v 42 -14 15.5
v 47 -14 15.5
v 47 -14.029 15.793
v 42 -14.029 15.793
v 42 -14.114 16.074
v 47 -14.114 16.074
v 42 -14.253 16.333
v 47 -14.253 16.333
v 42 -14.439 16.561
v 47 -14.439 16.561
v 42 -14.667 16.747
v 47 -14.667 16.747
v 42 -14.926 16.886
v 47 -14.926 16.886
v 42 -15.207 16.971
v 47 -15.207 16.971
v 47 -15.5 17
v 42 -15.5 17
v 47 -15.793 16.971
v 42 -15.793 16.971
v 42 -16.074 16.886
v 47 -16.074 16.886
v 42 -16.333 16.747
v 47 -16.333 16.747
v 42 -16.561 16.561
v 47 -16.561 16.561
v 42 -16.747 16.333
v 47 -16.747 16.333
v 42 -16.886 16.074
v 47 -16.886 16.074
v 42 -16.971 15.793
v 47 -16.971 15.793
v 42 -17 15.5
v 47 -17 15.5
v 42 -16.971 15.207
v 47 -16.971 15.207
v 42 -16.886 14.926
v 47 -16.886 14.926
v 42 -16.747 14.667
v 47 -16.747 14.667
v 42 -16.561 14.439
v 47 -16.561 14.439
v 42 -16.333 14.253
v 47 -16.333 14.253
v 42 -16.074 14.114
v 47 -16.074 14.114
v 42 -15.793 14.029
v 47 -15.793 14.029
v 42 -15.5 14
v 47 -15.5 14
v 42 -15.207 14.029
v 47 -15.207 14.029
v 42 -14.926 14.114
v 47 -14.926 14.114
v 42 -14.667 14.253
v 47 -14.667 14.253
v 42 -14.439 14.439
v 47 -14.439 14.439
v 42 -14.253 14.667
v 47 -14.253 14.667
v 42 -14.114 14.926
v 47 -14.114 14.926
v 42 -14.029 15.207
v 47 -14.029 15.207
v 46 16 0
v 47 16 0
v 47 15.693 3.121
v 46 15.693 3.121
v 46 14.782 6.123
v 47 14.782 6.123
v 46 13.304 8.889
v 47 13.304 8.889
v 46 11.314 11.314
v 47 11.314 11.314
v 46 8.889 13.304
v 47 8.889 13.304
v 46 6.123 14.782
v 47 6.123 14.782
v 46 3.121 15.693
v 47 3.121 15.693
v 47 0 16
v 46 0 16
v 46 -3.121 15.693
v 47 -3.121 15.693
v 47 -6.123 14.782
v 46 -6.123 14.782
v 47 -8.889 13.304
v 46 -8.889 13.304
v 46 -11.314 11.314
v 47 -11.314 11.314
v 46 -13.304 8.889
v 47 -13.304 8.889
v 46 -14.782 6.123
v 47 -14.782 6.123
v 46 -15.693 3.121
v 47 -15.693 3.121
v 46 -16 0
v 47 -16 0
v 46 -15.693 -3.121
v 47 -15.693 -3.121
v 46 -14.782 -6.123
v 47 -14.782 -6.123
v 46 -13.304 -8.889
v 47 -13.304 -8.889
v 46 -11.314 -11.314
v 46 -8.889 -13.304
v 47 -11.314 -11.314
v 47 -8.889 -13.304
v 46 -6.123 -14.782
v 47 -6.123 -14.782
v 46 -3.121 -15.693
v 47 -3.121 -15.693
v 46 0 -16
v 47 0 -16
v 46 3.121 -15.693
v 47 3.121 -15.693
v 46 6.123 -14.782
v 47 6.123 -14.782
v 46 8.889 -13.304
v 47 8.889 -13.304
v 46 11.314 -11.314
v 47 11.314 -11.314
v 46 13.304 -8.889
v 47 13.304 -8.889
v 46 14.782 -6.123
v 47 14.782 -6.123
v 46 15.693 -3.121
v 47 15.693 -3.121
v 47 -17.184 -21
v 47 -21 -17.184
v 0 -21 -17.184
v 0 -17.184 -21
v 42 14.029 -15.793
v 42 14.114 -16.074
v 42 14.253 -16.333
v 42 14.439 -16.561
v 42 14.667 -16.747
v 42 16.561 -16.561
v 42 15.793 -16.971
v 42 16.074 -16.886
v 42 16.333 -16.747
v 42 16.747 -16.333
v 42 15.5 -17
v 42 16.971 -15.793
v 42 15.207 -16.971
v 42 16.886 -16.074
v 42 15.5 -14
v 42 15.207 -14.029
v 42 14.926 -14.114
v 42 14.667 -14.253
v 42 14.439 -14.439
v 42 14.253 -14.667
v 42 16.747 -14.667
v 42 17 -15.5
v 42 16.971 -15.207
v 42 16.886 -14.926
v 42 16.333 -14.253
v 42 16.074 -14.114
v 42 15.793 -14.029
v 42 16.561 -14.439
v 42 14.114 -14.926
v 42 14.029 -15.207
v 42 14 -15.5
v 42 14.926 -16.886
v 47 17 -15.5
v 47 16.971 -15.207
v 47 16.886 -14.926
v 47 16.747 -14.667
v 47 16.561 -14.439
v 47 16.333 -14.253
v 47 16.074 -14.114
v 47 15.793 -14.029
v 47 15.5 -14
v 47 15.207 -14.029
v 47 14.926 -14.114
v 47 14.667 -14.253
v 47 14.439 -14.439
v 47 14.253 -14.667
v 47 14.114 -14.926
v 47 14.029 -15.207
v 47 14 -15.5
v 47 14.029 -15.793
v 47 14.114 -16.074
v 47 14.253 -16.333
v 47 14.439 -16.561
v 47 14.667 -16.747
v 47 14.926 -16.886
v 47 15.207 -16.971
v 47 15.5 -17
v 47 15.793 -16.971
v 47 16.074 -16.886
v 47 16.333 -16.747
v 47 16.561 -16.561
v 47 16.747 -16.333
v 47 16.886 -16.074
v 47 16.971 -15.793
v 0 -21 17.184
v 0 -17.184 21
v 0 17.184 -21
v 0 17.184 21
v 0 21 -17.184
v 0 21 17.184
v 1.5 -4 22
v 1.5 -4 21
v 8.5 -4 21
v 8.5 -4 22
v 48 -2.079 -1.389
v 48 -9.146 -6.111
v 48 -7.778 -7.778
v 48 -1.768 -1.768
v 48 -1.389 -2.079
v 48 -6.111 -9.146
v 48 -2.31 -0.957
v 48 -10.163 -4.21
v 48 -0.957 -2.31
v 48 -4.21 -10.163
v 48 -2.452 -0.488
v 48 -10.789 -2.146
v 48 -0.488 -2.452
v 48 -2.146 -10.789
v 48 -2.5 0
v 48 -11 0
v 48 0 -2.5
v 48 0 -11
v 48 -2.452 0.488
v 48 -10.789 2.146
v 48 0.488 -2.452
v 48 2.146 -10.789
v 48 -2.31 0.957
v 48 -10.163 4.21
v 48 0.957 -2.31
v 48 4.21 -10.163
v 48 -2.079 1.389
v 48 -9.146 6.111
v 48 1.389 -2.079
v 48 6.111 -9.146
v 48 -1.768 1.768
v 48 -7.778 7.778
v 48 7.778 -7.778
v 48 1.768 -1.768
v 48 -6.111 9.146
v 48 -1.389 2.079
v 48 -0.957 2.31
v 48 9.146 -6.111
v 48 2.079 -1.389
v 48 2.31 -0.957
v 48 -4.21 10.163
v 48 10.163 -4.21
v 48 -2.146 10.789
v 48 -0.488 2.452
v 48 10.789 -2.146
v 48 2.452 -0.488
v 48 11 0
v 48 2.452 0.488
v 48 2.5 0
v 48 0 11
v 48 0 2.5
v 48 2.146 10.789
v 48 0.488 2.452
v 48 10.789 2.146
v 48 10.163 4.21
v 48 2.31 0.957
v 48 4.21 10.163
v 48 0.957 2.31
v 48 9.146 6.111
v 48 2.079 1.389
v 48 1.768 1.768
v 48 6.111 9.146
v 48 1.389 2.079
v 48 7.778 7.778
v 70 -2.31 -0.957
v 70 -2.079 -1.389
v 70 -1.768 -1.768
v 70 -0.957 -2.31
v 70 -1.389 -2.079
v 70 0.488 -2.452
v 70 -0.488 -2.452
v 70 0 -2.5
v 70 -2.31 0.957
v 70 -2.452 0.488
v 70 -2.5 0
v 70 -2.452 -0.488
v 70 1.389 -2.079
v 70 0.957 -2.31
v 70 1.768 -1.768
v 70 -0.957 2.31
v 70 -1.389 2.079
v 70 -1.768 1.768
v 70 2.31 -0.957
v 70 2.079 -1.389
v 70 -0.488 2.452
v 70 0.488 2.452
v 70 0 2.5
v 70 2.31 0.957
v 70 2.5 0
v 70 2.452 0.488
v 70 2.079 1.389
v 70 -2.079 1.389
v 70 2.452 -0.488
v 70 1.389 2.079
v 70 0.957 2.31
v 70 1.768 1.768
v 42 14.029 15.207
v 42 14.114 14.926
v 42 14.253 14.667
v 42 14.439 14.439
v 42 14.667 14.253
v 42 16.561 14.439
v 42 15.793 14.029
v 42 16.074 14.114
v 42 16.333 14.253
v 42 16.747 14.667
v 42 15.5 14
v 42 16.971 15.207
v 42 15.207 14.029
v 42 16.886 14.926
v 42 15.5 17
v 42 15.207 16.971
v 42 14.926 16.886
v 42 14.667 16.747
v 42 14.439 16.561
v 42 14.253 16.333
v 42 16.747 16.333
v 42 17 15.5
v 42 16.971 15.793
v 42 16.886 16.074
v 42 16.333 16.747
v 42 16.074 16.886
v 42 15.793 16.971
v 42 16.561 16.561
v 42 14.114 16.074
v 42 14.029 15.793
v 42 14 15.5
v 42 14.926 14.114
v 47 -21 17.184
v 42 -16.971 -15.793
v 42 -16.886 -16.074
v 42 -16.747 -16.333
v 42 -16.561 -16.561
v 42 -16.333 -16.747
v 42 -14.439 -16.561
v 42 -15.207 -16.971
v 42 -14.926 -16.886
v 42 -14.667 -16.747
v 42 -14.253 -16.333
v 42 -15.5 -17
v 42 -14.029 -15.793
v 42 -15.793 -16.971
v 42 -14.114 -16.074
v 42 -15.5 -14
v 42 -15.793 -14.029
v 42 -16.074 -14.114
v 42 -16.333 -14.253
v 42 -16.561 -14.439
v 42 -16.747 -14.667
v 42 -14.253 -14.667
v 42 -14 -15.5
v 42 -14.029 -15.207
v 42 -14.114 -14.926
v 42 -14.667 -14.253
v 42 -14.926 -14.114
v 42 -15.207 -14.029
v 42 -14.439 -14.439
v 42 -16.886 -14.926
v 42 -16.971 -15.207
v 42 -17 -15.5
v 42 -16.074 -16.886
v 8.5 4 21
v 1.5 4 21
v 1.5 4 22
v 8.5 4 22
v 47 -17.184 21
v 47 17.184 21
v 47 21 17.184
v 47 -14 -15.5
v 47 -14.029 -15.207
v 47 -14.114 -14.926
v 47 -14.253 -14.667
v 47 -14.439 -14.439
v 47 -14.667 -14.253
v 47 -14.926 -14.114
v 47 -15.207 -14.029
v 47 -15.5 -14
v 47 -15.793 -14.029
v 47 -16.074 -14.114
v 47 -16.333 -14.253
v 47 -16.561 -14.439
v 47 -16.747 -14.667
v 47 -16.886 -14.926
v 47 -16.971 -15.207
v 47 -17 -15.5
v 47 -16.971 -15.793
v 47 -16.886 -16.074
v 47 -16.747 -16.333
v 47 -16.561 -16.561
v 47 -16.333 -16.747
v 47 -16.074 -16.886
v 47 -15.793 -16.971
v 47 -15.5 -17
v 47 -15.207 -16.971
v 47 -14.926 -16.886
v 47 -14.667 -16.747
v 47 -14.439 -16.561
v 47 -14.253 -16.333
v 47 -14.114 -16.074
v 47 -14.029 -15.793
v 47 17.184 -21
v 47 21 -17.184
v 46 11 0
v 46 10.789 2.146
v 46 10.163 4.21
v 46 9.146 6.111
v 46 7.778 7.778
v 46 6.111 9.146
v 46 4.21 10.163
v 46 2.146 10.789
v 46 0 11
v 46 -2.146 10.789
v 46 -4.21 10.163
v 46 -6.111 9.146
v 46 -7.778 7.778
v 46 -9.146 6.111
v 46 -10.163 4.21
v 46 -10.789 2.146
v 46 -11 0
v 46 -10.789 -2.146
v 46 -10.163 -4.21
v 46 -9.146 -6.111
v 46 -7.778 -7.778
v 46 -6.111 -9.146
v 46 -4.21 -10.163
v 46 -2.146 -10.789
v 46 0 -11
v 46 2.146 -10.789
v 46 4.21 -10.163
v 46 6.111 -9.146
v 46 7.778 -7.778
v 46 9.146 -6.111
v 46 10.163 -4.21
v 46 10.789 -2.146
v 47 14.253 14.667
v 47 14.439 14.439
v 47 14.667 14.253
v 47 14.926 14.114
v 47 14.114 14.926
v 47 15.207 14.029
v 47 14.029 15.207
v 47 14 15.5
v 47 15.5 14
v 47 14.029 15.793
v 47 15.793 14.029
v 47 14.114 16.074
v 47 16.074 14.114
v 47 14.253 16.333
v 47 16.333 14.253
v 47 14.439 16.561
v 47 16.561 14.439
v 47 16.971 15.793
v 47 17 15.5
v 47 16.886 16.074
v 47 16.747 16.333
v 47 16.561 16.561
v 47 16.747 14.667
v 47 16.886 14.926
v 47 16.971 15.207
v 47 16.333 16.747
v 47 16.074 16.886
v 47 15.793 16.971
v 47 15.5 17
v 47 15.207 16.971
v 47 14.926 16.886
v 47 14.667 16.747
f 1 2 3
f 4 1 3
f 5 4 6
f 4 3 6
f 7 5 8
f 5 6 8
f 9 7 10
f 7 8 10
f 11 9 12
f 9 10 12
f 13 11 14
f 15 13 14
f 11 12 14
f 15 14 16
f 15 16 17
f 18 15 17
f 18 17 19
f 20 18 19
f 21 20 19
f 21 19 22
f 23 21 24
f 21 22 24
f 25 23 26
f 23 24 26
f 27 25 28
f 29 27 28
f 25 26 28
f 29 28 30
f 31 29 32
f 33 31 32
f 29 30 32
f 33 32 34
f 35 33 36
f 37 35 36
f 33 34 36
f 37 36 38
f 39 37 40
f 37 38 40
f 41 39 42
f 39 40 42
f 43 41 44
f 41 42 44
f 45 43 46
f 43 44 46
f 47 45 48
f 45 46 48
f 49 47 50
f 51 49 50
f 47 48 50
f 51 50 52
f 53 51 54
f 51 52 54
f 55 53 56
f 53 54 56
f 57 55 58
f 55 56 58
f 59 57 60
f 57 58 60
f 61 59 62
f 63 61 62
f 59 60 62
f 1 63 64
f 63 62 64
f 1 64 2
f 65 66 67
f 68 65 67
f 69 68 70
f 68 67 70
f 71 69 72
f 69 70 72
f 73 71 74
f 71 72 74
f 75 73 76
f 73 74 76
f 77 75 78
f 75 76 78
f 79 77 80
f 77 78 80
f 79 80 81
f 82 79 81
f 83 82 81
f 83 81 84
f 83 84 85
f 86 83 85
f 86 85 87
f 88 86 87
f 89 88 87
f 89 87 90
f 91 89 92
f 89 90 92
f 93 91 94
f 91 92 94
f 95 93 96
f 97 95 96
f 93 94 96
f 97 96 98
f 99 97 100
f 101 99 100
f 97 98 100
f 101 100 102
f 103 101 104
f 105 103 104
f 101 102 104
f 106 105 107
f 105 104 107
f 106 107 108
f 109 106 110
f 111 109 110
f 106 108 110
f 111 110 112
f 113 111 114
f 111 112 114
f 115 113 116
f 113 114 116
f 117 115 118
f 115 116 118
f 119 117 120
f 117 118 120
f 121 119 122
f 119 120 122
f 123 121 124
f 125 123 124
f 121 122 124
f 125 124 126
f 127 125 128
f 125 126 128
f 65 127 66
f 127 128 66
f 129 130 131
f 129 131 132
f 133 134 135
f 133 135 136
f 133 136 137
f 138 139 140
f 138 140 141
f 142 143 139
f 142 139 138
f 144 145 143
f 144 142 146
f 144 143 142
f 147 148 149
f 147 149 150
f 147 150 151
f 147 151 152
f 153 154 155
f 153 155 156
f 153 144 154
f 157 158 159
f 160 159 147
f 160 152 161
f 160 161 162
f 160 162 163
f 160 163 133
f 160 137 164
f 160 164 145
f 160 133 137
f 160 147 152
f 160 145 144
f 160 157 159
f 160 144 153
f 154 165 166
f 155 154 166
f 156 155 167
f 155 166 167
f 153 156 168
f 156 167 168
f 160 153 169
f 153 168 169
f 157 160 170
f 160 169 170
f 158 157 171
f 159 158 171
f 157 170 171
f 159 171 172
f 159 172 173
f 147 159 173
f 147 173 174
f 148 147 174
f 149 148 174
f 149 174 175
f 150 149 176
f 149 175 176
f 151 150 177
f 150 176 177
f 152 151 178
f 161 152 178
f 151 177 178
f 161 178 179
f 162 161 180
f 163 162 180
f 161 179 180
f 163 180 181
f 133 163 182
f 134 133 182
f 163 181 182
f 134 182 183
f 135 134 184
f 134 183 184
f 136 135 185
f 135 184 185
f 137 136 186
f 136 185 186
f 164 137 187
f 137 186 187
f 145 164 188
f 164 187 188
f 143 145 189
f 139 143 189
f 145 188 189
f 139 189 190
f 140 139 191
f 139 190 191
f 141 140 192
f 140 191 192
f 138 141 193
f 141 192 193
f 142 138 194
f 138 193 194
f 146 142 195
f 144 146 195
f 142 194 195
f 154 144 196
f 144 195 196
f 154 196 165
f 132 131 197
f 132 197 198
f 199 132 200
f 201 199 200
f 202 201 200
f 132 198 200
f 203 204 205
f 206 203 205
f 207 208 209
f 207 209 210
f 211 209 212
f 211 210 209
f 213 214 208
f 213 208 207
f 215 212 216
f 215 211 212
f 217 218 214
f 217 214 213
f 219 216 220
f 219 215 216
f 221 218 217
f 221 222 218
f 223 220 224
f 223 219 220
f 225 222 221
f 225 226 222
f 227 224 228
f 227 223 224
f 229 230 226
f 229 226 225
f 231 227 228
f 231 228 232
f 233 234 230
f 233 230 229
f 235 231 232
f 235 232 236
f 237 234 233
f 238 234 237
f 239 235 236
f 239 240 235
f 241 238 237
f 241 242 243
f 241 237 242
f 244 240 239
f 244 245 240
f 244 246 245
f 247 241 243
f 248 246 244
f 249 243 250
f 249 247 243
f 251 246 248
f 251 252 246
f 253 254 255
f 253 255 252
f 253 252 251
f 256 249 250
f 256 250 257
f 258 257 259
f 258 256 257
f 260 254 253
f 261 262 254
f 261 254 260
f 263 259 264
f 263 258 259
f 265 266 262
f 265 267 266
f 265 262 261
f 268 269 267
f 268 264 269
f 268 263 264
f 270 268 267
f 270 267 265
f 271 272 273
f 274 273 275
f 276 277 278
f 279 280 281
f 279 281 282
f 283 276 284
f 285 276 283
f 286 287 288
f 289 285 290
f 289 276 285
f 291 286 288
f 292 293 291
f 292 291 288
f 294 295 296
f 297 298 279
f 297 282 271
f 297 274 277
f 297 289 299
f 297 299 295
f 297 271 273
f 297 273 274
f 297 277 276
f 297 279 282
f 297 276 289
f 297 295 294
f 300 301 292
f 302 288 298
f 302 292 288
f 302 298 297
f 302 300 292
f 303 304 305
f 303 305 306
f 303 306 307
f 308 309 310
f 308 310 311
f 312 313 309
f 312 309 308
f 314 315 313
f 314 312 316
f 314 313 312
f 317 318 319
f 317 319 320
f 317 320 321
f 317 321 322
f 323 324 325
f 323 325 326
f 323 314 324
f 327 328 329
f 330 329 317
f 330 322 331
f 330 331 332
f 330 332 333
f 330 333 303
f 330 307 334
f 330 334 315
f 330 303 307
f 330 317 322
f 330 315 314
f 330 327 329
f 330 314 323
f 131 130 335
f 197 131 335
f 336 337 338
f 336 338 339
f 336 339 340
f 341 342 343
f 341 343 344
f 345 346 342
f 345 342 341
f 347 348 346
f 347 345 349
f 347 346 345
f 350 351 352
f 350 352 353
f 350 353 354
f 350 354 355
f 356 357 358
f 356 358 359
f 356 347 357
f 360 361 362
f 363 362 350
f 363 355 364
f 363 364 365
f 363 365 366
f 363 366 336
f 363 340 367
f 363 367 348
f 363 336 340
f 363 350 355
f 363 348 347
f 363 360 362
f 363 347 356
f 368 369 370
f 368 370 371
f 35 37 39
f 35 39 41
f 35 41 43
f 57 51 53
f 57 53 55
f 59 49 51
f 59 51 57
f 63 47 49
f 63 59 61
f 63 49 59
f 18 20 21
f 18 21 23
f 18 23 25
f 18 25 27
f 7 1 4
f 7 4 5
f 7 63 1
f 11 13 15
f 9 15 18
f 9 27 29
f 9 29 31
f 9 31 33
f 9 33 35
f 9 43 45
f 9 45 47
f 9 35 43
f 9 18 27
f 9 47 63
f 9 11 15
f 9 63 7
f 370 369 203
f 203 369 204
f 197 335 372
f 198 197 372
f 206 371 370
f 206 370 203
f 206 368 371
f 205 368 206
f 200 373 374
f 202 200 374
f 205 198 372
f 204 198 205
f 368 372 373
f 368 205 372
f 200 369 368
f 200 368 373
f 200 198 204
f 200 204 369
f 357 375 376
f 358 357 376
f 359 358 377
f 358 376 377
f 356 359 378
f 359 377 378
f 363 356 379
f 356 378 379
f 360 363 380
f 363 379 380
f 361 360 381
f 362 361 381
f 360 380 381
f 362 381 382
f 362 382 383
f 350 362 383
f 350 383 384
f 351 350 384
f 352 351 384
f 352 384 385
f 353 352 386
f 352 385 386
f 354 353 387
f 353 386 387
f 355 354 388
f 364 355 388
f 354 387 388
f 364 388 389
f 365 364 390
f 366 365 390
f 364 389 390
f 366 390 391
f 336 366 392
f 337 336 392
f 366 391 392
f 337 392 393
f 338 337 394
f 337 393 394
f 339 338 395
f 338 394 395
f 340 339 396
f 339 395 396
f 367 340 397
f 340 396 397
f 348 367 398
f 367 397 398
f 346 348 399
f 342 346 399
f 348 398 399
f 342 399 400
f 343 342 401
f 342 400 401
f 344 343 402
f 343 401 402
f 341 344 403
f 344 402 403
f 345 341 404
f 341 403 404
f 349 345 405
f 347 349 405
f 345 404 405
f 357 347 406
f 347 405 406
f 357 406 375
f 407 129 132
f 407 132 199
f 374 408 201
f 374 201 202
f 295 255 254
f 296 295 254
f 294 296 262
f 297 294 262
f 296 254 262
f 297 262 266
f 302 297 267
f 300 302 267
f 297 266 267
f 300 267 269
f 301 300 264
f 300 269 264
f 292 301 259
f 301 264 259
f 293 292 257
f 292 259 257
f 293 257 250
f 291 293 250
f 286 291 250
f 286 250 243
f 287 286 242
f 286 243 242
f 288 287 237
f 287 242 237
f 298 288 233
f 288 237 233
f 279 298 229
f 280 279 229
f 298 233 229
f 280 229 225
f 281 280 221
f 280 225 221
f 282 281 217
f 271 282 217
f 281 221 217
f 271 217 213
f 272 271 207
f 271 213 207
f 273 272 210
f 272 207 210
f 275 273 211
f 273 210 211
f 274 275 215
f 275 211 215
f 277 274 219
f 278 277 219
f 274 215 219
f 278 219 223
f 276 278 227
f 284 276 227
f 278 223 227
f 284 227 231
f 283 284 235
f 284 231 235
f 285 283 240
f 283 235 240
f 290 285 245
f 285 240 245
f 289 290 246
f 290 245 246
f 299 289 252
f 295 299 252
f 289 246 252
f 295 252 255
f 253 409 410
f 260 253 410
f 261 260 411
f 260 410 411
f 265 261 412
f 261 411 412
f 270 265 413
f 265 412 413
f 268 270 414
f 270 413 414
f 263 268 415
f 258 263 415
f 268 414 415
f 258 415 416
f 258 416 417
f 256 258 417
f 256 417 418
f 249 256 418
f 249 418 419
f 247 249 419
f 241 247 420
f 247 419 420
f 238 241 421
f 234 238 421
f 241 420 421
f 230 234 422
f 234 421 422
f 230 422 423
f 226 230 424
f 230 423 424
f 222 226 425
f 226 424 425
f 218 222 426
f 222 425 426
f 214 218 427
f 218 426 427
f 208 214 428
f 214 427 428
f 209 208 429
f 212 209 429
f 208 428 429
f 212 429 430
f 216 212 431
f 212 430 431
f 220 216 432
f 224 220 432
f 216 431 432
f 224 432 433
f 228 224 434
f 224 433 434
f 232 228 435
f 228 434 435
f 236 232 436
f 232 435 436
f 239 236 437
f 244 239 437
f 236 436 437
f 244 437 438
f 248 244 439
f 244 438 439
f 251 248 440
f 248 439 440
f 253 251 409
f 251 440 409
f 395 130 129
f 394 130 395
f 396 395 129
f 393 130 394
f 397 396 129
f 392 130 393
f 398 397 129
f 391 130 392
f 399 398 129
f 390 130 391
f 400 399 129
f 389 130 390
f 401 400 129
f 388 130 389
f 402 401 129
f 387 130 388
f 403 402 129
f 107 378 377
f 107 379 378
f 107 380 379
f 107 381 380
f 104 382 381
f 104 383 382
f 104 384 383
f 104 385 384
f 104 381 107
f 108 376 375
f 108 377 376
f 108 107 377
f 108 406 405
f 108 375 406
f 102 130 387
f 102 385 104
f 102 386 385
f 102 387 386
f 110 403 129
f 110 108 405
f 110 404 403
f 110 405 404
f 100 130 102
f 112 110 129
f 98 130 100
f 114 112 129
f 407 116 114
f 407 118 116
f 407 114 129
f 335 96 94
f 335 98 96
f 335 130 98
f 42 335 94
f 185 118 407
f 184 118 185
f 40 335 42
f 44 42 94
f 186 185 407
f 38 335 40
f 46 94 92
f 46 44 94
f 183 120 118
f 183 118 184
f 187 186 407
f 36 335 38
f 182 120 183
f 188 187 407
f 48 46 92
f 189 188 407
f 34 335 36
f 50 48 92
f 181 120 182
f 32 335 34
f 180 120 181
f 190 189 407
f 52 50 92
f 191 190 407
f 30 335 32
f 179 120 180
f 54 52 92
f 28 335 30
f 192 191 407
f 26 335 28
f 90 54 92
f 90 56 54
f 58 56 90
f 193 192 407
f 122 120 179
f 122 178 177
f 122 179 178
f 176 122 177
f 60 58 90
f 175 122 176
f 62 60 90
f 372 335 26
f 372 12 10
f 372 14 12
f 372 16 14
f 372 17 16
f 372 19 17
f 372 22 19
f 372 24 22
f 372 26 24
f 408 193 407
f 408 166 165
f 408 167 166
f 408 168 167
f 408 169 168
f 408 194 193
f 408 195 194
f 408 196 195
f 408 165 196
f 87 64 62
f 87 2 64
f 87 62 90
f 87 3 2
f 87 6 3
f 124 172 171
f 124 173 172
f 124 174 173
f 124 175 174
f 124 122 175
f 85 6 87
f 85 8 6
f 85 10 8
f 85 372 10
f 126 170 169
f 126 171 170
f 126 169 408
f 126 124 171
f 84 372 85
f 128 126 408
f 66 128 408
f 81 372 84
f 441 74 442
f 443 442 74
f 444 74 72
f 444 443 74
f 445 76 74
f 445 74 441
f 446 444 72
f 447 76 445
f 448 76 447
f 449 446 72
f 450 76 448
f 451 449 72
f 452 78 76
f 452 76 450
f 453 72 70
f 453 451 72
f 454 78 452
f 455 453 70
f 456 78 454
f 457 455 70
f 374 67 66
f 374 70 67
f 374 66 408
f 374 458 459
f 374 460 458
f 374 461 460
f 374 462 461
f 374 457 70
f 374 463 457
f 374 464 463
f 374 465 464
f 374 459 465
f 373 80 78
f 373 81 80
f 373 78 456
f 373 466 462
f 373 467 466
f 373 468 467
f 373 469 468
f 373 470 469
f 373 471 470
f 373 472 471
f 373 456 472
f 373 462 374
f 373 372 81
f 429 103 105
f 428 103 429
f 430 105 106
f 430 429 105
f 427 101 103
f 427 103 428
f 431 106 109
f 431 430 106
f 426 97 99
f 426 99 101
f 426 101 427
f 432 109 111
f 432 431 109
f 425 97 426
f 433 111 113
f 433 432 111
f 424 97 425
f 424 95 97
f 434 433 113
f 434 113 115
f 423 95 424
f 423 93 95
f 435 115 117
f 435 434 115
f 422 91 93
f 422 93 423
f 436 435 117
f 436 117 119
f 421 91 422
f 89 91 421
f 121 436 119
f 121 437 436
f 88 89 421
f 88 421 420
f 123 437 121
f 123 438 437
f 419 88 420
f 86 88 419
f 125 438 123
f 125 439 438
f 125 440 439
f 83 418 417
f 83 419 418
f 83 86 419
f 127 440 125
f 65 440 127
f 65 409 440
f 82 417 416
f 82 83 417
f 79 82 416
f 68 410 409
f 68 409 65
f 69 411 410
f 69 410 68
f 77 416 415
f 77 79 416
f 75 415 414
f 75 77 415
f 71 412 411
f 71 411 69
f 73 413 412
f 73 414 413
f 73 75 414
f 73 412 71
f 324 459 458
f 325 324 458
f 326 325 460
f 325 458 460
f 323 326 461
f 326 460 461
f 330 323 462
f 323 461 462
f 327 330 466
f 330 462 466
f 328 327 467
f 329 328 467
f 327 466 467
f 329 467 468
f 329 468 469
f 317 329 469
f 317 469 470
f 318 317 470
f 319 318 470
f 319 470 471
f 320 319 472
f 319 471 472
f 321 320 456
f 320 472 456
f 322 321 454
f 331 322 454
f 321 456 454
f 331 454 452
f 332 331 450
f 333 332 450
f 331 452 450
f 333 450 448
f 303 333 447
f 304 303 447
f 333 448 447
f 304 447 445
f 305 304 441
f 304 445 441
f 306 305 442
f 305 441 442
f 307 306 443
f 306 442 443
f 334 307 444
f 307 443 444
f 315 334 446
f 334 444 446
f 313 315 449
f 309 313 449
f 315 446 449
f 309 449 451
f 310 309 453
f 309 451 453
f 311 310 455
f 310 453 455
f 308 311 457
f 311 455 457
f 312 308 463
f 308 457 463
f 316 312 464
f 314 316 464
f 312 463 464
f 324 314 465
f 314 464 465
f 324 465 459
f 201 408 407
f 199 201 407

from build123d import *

# Parameters (mm, degrees)
SKETCH_W        = 42
SKETCH_H        = 42
PAD_DEPTH       = 47
SKETCH001_R     = 1.5
POCKET_DEPTH    = 5
POCKET001_DEPTH = 47
SKETCH003_R     = 16
POCKET002_DEPTH = 1
SKETCH004_R     = 11
PAD001_DEPTH    = 2
SKETCH005_R     = 2.5
PAD002_DEPTH    = 22
SKETCH006_W     = 8
SKETCH006_H     = 7
PAD003_DEPTH    = 1


with BuildPart() as part:
    # Sketch → Pad (new body)
    with BuildSketch(Plane.YZ):
        Rectangle(SKETCH_W, SKETCH_H)
    extrude(amount=PAD_DEPTH)

    # Sketch001 → Pocket (cut)
    with BuildSketch(Plane.YZ.offset(47)):
        with Locations((15.5, 15.5)):
            Circle(SKETCH001_R)
        with Locations((-15.5, 15.5)):
            Circle(SKETCH001_R)
        with Locations((-15.5, -15.5)):
            Circle(SKETCH001_R)
        with Locations((15.5, -15.5)):
            Circle(SKETCH001_R)
    extrude(amount=-POCKET_DEPTH, mode=Mode.SUBTRACT)

    # Sketch002 → Pocket001 (cut)
    with BuildSketch(Plane.YZ.offset(47)):
        Polygon((-21, 21), (-21, 17.183766), (-17.183766, 21), align=None)
        Polygon((21, 21), (17.183766, 21), (21, 17.183766), align=None)
        Polygon((21, -21), (21, -17.183766), (17.183766, -21), align=None)
        Polygon((-21, -21), (-21, -17.183766), (-17.183766, -21), align=None)
    extrude(amount=-POCKET001_DEPTH, mode=Mode.SUBTRACT)

    # Sketch003 → Pocket002 (cut)
    with BuildSketch(Plane.YZ.offset(47)):
        Circle(SKETCH003_R)
    extrude(amount=-POCKET002_DEPTH, mode=Mode.SUBTRACT)

    # Sketch004 → Pad001 (new body)
    with BuildSketch(Plane.YZ.offset(46)):
        Circle(SKETCH004_R)
    extrude(amount=PAD001_DEPTH)

    # Sketch005 → Pad002 (new body)
    with BuildSketch(Plane.YZ.offset(48)):
        Circle(SKETCH005_R)
    extrude(amount=PAD002_DEPTH)

    # Sketch006 → Pad003 (new body)
    with BuildSketch(Plane(origin=(0, 0, 21), x_dir=(0, -1, 0), z_dir=(0, 0, 1))):
        with Locations((0, 5)):
            Rectangle(SKETCH006_W, SKETCH006_H)
    extrude(amount=PAD003_DEPTH)


solid = part.part
